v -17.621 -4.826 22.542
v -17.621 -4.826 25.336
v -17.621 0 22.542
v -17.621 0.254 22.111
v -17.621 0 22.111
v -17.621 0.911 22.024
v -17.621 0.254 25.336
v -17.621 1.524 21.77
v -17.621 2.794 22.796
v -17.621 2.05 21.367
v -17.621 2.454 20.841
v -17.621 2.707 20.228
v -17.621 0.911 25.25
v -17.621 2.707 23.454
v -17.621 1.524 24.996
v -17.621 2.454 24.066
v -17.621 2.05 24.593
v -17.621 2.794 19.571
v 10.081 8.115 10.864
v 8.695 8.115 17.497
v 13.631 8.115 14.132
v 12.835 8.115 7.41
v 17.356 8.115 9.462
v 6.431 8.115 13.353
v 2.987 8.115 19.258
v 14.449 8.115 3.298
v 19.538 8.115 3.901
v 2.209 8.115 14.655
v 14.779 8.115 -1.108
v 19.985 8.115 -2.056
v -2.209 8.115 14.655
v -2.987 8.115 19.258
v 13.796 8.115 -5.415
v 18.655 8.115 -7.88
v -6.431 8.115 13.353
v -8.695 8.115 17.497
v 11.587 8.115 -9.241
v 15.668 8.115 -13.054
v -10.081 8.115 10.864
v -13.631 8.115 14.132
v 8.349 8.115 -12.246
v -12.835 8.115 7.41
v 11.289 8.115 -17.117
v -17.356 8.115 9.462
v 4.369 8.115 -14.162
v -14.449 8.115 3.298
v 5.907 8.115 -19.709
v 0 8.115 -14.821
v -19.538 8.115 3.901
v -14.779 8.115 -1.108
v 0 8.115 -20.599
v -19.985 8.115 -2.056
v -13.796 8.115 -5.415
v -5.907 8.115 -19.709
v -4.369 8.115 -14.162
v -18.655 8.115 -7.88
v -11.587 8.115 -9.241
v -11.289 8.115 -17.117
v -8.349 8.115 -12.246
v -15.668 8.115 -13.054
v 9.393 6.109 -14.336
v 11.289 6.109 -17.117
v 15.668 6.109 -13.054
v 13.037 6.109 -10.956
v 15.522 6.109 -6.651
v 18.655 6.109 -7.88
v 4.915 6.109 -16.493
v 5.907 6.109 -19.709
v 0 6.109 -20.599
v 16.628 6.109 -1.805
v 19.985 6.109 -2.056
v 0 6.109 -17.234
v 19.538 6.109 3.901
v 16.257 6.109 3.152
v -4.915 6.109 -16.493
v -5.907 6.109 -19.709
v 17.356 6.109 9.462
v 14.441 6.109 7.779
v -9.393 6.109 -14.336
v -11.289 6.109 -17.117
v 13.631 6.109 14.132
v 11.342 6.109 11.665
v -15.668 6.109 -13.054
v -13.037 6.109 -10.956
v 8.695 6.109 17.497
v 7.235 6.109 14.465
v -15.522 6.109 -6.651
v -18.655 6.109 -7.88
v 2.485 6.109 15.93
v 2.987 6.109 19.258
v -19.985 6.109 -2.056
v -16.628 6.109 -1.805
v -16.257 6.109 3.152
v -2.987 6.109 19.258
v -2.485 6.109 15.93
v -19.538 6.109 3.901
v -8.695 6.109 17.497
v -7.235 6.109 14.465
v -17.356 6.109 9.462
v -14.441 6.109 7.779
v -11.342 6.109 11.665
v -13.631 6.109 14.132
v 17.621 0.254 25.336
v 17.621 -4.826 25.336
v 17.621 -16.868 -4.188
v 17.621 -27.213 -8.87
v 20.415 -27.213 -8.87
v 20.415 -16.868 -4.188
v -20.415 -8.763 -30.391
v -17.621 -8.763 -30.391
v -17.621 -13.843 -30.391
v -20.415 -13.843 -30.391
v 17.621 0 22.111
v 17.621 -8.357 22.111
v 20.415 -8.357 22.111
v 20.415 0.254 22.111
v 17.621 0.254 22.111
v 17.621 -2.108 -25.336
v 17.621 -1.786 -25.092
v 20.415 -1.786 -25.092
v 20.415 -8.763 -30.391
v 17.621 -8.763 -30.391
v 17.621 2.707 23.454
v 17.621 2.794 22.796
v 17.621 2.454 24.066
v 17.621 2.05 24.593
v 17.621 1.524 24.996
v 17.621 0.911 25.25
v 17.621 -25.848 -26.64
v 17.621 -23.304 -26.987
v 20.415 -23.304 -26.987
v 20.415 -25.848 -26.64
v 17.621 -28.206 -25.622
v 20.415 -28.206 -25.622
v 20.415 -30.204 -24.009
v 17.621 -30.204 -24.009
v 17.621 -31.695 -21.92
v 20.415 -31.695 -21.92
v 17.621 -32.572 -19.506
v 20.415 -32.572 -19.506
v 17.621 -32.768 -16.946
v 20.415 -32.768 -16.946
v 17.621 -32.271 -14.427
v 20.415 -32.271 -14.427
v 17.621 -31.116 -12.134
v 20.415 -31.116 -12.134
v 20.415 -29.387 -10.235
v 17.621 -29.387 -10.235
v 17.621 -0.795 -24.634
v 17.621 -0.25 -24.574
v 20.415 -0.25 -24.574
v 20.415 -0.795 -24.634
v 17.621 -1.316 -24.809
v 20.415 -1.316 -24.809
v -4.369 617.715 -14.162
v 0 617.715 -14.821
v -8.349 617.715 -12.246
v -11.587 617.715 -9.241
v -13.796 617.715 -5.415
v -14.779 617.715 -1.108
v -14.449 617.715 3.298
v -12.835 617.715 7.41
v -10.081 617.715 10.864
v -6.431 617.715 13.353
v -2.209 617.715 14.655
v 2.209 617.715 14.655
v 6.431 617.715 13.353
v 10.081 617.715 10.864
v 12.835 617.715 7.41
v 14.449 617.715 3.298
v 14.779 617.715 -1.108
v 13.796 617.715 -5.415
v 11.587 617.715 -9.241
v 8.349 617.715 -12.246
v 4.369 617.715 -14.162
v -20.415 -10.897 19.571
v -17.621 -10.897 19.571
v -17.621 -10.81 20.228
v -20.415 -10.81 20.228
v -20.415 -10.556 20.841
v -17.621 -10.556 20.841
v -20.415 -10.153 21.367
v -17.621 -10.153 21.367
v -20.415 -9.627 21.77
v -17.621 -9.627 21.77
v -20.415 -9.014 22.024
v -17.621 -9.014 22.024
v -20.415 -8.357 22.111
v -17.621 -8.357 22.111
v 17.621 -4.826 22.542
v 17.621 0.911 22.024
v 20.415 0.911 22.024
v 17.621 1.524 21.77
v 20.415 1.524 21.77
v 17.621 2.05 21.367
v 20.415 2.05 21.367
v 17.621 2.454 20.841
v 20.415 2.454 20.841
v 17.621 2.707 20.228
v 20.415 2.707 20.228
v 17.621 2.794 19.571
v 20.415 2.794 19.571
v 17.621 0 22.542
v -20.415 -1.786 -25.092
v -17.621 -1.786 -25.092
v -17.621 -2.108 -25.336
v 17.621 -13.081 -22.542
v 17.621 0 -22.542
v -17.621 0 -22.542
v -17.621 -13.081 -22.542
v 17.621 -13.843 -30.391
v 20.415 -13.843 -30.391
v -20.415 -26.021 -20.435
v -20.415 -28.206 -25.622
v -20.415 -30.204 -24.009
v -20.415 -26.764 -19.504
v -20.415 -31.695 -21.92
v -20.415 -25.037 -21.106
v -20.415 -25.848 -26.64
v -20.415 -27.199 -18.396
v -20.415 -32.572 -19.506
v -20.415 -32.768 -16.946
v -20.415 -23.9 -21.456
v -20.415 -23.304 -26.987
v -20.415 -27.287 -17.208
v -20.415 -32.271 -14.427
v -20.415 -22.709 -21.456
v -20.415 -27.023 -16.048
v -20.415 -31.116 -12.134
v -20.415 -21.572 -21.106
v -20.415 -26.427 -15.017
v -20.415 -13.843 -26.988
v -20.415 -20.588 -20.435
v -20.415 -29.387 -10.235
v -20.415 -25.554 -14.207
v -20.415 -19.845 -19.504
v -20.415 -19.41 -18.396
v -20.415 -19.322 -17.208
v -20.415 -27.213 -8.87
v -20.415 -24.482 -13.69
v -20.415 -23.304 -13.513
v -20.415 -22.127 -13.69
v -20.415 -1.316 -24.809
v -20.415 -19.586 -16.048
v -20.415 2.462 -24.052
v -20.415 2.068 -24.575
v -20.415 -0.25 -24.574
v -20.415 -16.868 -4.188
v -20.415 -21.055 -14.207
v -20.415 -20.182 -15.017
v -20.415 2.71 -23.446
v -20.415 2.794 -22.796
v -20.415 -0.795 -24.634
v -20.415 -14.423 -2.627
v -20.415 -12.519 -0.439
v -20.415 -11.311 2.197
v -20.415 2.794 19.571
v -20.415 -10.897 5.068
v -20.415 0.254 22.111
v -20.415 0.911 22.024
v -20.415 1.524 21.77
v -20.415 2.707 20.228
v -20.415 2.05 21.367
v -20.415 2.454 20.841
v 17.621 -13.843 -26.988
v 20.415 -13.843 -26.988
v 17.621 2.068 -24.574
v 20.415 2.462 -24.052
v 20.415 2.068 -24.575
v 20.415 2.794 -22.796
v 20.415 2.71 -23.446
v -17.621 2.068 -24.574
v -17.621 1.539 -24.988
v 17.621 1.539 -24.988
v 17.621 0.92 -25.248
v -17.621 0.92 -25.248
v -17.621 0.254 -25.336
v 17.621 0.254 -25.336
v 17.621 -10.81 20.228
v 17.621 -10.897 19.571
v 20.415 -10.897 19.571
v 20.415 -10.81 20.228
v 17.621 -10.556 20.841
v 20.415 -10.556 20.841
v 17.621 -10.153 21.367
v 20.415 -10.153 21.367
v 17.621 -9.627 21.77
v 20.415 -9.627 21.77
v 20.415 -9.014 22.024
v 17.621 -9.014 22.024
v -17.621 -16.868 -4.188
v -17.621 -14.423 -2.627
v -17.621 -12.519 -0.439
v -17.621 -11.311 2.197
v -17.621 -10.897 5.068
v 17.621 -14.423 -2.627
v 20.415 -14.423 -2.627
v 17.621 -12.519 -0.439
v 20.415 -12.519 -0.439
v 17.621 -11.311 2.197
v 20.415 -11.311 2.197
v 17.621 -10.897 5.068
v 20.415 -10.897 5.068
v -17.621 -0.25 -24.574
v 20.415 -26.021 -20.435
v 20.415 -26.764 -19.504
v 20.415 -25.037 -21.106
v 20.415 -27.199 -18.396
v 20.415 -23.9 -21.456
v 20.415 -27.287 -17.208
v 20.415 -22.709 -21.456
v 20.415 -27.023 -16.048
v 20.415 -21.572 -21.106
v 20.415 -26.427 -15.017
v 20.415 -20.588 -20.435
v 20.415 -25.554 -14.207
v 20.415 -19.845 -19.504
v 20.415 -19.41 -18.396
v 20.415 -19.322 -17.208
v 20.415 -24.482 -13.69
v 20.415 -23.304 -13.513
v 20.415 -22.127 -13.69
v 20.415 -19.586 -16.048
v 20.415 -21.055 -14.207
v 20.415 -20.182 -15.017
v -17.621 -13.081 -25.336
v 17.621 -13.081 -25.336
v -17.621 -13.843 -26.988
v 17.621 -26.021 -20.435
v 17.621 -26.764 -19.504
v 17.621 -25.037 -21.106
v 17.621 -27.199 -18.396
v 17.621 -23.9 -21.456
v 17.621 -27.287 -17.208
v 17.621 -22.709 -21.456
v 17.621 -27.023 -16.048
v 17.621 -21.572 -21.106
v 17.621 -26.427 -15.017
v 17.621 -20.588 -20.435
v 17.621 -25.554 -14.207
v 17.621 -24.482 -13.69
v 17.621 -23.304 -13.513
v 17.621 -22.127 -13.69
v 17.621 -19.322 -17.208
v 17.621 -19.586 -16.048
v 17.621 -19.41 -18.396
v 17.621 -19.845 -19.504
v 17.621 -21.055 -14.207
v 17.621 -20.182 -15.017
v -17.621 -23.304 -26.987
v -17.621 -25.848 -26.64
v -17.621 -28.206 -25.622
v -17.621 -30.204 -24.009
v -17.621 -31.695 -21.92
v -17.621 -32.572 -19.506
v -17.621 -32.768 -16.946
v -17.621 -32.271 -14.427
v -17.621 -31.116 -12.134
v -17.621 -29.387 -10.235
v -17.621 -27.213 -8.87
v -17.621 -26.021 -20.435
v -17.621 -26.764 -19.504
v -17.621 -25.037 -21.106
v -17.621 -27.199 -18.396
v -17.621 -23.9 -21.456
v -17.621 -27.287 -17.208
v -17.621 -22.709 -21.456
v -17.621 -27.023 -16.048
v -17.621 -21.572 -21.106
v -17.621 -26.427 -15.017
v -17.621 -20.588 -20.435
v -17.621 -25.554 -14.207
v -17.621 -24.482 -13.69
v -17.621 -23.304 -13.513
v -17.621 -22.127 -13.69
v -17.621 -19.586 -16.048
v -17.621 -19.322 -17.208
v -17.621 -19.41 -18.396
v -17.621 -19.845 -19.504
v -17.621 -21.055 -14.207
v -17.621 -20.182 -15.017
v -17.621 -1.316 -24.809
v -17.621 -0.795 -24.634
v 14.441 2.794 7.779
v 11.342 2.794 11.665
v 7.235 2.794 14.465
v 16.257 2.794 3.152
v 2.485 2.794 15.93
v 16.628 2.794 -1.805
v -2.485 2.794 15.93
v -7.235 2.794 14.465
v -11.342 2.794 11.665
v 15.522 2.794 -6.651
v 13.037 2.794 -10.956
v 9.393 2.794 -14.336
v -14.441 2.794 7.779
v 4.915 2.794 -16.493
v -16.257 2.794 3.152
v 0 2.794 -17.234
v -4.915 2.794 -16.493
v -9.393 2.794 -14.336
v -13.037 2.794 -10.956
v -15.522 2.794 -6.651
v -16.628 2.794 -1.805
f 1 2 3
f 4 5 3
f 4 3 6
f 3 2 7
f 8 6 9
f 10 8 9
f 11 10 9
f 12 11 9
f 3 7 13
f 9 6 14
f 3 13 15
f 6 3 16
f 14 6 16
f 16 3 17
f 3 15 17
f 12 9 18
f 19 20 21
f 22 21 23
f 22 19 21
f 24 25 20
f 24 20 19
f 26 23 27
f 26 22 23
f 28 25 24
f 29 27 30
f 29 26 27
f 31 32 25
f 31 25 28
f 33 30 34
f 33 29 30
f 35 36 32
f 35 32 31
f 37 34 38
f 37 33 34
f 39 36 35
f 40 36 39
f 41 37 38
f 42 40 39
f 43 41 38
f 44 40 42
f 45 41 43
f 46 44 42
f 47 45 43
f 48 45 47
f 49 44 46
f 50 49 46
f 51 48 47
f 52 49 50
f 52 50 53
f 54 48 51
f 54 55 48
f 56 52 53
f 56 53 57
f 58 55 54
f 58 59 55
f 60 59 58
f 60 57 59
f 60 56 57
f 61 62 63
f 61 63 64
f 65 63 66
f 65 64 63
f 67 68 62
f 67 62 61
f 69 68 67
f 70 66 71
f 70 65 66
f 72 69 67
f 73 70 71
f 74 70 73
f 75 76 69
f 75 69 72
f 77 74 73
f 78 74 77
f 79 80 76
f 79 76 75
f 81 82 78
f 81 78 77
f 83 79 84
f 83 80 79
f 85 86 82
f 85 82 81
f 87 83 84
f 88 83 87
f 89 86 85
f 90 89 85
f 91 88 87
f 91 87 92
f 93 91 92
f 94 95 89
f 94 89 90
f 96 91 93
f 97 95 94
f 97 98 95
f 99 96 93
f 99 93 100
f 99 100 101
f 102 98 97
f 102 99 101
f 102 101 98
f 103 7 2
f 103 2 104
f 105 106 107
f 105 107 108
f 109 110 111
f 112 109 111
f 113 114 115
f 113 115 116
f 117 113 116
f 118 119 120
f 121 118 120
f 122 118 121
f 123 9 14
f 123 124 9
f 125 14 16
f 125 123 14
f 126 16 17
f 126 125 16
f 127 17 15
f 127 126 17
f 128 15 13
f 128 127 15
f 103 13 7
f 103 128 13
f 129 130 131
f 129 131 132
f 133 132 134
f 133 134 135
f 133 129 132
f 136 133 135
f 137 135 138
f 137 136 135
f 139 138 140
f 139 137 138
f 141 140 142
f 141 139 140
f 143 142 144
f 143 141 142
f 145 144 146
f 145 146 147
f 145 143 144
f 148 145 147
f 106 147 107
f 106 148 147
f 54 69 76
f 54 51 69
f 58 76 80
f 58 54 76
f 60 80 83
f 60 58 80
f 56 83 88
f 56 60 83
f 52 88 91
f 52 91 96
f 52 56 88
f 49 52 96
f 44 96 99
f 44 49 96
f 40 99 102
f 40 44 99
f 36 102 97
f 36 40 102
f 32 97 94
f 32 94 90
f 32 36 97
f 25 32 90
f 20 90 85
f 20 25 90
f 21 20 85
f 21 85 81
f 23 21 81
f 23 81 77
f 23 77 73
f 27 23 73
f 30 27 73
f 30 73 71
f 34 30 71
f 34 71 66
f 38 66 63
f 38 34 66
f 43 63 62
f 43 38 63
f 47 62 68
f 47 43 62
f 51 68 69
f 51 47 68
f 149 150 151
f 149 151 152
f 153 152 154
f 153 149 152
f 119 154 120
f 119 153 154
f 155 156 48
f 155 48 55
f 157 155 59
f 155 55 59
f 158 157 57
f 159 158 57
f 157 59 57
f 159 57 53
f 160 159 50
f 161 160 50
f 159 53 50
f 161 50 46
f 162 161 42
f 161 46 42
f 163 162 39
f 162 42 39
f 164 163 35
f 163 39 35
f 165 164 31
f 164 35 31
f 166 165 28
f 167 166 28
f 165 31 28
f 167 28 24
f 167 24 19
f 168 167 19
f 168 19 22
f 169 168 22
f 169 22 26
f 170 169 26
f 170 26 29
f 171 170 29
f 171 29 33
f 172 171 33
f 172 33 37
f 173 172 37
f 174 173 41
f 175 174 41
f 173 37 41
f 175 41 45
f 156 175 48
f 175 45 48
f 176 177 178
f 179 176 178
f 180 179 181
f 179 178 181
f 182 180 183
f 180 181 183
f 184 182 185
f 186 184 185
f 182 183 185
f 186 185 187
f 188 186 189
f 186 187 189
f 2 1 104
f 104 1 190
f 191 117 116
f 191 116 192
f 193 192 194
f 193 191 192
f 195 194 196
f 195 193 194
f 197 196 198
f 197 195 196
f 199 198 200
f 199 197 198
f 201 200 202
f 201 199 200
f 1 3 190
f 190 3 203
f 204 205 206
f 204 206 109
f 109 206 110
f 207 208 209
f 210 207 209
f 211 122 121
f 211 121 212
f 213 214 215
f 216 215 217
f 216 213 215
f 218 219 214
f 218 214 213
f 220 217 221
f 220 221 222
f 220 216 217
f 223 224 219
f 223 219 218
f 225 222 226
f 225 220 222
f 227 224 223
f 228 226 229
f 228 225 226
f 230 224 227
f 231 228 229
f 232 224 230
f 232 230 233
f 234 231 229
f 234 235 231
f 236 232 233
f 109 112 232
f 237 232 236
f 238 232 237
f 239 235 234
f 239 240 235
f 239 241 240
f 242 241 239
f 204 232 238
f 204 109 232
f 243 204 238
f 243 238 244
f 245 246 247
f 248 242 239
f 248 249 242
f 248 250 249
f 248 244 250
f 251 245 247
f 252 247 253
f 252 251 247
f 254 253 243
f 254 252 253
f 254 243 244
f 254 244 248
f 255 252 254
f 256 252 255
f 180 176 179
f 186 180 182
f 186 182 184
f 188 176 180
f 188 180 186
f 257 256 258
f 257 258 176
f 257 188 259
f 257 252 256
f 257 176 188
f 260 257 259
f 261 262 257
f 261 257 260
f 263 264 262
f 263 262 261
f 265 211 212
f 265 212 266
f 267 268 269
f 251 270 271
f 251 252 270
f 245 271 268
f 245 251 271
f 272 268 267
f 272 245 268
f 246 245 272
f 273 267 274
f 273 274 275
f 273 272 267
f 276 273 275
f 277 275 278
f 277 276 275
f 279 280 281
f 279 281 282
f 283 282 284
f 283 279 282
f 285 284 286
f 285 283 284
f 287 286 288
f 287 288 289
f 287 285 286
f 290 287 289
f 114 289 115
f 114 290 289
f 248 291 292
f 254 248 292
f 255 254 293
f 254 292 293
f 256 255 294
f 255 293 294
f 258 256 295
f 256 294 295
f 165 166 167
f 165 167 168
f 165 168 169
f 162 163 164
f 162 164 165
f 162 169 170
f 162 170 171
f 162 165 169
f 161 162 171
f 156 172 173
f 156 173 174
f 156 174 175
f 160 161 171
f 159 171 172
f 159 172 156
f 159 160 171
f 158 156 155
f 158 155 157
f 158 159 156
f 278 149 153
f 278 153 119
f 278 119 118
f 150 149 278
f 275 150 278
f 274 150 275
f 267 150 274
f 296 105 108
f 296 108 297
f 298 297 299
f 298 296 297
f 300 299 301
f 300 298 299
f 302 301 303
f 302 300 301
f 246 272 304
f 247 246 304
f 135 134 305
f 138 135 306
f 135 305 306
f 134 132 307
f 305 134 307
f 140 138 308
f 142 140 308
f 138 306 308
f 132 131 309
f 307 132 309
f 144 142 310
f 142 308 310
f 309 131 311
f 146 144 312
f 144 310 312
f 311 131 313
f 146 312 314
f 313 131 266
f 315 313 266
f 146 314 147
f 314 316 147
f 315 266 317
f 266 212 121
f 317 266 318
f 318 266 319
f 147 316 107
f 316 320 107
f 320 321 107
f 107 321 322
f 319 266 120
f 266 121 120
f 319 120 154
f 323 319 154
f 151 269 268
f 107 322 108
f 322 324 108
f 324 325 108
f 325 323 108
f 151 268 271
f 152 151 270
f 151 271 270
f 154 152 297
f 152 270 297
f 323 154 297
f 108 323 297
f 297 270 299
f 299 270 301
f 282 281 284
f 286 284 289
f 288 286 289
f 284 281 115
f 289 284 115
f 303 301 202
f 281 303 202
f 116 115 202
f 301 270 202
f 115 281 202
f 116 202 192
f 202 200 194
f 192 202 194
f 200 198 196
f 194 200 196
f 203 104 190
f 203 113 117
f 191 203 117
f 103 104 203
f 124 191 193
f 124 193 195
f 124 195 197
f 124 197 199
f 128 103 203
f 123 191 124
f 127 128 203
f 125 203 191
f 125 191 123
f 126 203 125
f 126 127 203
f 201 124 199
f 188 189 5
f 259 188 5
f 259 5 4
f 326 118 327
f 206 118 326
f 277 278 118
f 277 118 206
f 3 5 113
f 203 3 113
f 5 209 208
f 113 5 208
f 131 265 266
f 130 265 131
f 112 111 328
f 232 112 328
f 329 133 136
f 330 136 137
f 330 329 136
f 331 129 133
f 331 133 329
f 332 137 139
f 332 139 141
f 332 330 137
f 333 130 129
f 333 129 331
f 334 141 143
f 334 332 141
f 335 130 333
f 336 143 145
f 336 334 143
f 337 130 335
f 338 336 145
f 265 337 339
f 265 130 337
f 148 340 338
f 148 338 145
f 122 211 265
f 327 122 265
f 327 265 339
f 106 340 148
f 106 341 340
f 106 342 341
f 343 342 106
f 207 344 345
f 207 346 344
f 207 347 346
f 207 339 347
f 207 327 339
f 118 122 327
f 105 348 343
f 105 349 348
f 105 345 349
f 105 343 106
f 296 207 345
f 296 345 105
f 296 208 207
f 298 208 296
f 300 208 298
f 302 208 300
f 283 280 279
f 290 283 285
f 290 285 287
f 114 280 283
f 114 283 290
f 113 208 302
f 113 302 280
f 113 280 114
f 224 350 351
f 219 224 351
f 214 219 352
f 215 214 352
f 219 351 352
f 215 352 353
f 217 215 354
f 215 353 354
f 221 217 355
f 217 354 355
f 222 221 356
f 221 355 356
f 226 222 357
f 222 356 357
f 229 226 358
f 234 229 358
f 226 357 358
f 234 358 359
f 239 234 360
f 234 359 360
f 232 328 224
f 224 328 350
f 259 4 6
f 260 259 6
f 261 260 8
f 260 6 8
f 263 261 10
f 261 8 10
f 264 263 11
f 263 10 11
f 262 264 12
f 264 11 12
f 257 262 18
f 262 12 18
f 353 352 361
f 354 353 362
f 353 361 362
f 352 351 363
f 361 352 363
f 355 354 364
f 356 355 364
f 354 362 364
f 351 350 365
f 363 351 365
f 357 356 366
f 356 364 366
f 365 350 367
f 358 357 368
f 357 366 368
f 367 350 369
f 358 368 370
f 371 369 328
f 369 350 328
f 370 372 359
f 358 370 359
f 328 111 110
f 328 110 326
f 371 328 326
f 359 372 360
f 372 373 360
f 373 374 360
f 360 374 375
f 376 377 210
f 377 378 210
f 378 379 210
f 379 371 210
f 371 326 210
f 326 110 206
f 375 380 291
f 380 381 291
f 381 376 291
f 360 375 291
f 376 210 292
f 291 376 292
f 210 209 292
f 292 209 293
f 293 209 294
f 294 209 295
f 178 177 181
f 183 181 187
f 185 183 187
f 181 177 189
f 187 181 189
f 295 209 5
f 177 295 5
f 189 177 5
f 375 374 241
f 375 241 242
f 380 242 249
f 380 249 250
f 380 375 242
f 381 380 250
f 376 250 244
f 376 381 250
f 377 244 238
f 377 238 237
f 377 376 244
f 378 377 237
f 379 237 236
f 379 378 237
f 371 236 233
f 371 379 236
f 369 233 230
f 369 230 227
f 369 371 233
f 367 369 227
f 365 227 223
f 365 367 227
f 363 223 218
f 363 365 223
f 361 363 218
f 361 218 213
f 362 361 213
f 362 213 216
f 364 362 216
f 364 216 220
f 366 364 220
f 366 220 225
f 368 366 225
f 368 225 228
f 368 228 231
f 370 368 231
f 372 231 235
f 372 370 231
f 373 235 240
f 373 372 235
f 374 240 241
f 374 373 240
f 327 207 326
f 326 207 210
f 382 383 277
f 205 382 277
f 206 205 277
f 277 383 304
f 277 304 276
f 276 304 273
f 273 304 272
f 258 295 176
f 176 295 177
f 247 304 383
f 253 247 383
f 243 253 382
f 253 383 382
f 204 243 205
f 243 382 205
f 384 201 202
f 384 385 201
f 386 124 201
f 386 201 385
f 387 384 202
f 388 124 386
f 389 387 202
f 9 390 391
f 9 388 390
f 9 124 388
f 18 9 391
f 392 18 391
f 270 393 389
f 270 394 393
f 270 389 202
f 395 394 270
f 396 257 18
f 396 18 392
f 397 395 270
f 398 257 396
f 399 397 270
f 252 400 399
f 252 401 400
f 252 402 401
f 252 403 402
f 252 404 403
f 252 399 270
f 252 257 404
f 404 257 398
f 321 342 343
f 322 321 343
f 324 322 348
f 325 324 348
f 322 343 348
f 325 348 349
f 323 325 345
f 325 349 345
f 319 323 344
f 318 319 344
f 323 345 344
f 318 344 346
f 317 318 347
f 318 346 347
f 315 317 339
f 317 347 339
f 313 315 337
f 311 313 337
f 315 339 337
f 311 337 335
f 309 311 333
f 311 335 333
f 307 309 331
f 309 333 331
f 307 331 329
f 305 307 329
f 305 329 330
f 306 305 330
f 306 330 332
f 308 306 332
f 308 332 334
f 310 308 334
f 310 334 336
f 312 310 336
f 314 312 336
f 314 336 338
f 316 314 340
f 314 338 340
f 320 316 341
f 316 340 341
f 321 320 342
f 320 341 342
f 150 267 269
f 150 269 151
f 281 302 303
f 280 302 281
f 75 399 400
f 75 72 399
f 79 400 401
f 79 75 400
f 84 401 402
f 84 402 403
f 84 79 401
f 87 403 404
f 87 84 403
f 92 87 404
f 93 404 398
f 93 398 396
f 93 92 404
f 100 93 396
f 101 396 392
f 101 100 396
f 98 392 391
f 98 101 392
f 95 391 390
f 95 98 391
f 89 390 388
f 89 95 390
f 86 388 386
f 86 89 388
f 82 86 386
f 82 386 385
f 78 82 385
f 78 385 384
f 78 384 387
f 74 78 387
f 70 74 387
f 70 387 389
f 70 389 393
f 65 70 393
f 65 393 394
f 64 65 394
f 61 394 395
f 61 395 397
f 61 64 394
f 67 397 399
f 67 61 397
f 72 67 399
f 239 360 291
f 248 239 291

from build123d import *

# Parameters (mm, degrees)
SKETCH1_W           = 35.2425
SKETCH1_H           = 45.085
BOSS_EXTRUDE1_DEPTH = 2.794
SKETCH3_W           = 35.2425
SKETCH3_H           = 7.62
BOSS_EXTRUDE2_DEPTH = 2.794
SKETCH4_W           = 35.2425
SKETCH4_H           = 15.875
BOSS_EXTRUDE3_DEPTH = 2.794
SKETCH5_R           = 3.99415
BOSS_EXTRUDE5_DEPTH = 2.794
SKETCH8_R           = 14.8209
BOSS_EXTRUDE6_DEPTH = 609.6
FILLET1_R           = 2.54


with BuildPart() as part:
    # Sketch1 → Boss-Extrude1 (new body)
    with BuildSketch(Plane(origin=(0, 0, 0), x_dir=(1, 0, 0), z_dir=(0, 1, 0))):
        Rectangle(SKETCH1_W, SKETCH1_H)
    extrude(amount=BOSS_EXTRUDE1_DEPTH)

    # Sketch3 → Boss-Extrude2 (add)
    with BuildSketch(Plane.XY.offset(22.5425)):
        with Locations((0, -1.016)):
            Rectangle(SKETCH3_W, SKETCH3_H)
    extrude(amount=BOSS_EXTRUDE2_DEPTH)

    # Sketch4 → Boss-Extrude3 (add)
    with BuildSketch(Plane(origin=(0, 0, -22.5425), x_dir=(-1, 0, 0), z_dir=(0, 0, -1))):
        with Locations((0, -5.1435)):
            Rectangle(SKETCH4_W, SKETCH4_H)
    extrude(amount=BOSS_EXTRUDE3_DEPTH)

    # Sketch5 → Boss-Extrude5 (add)
    with BuildSketch(Plane.ZY.offset(17.62125)):
        with BuildLine():
            Line((-24.5745, 2.794), (-24.5745, -0.249652205))
            ThreePointArc((-24.5745, -0.249652205), (-24.707295287, -1.060186269), (-25.091795645, -1.785968283))
            Line((-25.091795645, -1.785968283), (-30.3911, -8.763))
            Line((-30.3911, -8.763), (-30.3911, -13.843))
            Line((-30.3911, -13.843), (-26.9875, -13.843))
            Line((-26.9875, -13.843), (-26.9875, -23.3045))
            ThreePointArc((-26.9875, -23.3045), (-19.506235123, -32.571845213), (-8.869629771, -27.213147793))
            Line((-8.869629771, -27.213147793), (-4.188060723, -16.867828085))
            ThreePointArc((-4.188060723, -16.867828085), (-0.439339327, -12.518932794), (5.068277097, -10.8966))
            Line((5.068277097, -10.8966), (19.5707, -10.8966))
            ThreePointArc((19.5707, -10.8966), (21.366751224, -10.152651224), (22.1107, -8.3566))
            Line((22.1107, -8.3566), (22.1107, 0.254))
            ThreePointArc((22.1107, 0.254), (21.366751224, 2.050051224), (19.5707, 2.794))
            Line((19.5707, 2.794), (-24.5745, 2.794))
        make_face()
        with Locations((-17.50695, -23.3045)):
            Circle(SKETCH5_R, mode=Mode.SUBTRACT)
    boss_extrude5 = extrude(amount=BOSS_EXTRUDE5_DEPTH)

    # Mirror1: Boss-Extrude5 across plane
    add(boss_extrude5.mirror(Plane(origin=(0, 0, 0), x_dir=(0, 0, 1), z_dir=(1, 0, 0))))

    # Sketch6 → Revolve1 (revolve)
    with BuildSketch(Plane(origin=(0, 0, 0), x_dir=(0, 0, -1), z_dir=(1, 0, 0))):
        Polygon((0.5588, 2.794), (17.2339, 2.794), (17.2339, 6.1087), (20.5994, 6.1087), (20.5994, 8.1153), (0.5588, 8.1153), align=None)
    revolve(axis=Axis((0, 2.794, -0.5588), (0, 1, 0)))

    # Sketch8 → Boss-Extrude6 (add)
    with BuildSketch(Plane(origin=(0, 8.1153, 0), x_dir=(1, 0, 0), z_dir=(0, 1, 0))):
        with Locations(Location((0, 0, 0), (0, 0, 90))):
            Circle(SKETCH8_R)
    extrude(amount=BOSS_EXTRUDE6_DEPTH)

    # Fillet1
    fillet1_edges = [part.edges().sort_by_distance(p)[0] for p in [
        (0, 2.794, -25.3365),
        (0, 2.794, 25.3365),
    ]]
    fillet(fillet1_edges, radius=FILLET1_R)


solid = part.part
